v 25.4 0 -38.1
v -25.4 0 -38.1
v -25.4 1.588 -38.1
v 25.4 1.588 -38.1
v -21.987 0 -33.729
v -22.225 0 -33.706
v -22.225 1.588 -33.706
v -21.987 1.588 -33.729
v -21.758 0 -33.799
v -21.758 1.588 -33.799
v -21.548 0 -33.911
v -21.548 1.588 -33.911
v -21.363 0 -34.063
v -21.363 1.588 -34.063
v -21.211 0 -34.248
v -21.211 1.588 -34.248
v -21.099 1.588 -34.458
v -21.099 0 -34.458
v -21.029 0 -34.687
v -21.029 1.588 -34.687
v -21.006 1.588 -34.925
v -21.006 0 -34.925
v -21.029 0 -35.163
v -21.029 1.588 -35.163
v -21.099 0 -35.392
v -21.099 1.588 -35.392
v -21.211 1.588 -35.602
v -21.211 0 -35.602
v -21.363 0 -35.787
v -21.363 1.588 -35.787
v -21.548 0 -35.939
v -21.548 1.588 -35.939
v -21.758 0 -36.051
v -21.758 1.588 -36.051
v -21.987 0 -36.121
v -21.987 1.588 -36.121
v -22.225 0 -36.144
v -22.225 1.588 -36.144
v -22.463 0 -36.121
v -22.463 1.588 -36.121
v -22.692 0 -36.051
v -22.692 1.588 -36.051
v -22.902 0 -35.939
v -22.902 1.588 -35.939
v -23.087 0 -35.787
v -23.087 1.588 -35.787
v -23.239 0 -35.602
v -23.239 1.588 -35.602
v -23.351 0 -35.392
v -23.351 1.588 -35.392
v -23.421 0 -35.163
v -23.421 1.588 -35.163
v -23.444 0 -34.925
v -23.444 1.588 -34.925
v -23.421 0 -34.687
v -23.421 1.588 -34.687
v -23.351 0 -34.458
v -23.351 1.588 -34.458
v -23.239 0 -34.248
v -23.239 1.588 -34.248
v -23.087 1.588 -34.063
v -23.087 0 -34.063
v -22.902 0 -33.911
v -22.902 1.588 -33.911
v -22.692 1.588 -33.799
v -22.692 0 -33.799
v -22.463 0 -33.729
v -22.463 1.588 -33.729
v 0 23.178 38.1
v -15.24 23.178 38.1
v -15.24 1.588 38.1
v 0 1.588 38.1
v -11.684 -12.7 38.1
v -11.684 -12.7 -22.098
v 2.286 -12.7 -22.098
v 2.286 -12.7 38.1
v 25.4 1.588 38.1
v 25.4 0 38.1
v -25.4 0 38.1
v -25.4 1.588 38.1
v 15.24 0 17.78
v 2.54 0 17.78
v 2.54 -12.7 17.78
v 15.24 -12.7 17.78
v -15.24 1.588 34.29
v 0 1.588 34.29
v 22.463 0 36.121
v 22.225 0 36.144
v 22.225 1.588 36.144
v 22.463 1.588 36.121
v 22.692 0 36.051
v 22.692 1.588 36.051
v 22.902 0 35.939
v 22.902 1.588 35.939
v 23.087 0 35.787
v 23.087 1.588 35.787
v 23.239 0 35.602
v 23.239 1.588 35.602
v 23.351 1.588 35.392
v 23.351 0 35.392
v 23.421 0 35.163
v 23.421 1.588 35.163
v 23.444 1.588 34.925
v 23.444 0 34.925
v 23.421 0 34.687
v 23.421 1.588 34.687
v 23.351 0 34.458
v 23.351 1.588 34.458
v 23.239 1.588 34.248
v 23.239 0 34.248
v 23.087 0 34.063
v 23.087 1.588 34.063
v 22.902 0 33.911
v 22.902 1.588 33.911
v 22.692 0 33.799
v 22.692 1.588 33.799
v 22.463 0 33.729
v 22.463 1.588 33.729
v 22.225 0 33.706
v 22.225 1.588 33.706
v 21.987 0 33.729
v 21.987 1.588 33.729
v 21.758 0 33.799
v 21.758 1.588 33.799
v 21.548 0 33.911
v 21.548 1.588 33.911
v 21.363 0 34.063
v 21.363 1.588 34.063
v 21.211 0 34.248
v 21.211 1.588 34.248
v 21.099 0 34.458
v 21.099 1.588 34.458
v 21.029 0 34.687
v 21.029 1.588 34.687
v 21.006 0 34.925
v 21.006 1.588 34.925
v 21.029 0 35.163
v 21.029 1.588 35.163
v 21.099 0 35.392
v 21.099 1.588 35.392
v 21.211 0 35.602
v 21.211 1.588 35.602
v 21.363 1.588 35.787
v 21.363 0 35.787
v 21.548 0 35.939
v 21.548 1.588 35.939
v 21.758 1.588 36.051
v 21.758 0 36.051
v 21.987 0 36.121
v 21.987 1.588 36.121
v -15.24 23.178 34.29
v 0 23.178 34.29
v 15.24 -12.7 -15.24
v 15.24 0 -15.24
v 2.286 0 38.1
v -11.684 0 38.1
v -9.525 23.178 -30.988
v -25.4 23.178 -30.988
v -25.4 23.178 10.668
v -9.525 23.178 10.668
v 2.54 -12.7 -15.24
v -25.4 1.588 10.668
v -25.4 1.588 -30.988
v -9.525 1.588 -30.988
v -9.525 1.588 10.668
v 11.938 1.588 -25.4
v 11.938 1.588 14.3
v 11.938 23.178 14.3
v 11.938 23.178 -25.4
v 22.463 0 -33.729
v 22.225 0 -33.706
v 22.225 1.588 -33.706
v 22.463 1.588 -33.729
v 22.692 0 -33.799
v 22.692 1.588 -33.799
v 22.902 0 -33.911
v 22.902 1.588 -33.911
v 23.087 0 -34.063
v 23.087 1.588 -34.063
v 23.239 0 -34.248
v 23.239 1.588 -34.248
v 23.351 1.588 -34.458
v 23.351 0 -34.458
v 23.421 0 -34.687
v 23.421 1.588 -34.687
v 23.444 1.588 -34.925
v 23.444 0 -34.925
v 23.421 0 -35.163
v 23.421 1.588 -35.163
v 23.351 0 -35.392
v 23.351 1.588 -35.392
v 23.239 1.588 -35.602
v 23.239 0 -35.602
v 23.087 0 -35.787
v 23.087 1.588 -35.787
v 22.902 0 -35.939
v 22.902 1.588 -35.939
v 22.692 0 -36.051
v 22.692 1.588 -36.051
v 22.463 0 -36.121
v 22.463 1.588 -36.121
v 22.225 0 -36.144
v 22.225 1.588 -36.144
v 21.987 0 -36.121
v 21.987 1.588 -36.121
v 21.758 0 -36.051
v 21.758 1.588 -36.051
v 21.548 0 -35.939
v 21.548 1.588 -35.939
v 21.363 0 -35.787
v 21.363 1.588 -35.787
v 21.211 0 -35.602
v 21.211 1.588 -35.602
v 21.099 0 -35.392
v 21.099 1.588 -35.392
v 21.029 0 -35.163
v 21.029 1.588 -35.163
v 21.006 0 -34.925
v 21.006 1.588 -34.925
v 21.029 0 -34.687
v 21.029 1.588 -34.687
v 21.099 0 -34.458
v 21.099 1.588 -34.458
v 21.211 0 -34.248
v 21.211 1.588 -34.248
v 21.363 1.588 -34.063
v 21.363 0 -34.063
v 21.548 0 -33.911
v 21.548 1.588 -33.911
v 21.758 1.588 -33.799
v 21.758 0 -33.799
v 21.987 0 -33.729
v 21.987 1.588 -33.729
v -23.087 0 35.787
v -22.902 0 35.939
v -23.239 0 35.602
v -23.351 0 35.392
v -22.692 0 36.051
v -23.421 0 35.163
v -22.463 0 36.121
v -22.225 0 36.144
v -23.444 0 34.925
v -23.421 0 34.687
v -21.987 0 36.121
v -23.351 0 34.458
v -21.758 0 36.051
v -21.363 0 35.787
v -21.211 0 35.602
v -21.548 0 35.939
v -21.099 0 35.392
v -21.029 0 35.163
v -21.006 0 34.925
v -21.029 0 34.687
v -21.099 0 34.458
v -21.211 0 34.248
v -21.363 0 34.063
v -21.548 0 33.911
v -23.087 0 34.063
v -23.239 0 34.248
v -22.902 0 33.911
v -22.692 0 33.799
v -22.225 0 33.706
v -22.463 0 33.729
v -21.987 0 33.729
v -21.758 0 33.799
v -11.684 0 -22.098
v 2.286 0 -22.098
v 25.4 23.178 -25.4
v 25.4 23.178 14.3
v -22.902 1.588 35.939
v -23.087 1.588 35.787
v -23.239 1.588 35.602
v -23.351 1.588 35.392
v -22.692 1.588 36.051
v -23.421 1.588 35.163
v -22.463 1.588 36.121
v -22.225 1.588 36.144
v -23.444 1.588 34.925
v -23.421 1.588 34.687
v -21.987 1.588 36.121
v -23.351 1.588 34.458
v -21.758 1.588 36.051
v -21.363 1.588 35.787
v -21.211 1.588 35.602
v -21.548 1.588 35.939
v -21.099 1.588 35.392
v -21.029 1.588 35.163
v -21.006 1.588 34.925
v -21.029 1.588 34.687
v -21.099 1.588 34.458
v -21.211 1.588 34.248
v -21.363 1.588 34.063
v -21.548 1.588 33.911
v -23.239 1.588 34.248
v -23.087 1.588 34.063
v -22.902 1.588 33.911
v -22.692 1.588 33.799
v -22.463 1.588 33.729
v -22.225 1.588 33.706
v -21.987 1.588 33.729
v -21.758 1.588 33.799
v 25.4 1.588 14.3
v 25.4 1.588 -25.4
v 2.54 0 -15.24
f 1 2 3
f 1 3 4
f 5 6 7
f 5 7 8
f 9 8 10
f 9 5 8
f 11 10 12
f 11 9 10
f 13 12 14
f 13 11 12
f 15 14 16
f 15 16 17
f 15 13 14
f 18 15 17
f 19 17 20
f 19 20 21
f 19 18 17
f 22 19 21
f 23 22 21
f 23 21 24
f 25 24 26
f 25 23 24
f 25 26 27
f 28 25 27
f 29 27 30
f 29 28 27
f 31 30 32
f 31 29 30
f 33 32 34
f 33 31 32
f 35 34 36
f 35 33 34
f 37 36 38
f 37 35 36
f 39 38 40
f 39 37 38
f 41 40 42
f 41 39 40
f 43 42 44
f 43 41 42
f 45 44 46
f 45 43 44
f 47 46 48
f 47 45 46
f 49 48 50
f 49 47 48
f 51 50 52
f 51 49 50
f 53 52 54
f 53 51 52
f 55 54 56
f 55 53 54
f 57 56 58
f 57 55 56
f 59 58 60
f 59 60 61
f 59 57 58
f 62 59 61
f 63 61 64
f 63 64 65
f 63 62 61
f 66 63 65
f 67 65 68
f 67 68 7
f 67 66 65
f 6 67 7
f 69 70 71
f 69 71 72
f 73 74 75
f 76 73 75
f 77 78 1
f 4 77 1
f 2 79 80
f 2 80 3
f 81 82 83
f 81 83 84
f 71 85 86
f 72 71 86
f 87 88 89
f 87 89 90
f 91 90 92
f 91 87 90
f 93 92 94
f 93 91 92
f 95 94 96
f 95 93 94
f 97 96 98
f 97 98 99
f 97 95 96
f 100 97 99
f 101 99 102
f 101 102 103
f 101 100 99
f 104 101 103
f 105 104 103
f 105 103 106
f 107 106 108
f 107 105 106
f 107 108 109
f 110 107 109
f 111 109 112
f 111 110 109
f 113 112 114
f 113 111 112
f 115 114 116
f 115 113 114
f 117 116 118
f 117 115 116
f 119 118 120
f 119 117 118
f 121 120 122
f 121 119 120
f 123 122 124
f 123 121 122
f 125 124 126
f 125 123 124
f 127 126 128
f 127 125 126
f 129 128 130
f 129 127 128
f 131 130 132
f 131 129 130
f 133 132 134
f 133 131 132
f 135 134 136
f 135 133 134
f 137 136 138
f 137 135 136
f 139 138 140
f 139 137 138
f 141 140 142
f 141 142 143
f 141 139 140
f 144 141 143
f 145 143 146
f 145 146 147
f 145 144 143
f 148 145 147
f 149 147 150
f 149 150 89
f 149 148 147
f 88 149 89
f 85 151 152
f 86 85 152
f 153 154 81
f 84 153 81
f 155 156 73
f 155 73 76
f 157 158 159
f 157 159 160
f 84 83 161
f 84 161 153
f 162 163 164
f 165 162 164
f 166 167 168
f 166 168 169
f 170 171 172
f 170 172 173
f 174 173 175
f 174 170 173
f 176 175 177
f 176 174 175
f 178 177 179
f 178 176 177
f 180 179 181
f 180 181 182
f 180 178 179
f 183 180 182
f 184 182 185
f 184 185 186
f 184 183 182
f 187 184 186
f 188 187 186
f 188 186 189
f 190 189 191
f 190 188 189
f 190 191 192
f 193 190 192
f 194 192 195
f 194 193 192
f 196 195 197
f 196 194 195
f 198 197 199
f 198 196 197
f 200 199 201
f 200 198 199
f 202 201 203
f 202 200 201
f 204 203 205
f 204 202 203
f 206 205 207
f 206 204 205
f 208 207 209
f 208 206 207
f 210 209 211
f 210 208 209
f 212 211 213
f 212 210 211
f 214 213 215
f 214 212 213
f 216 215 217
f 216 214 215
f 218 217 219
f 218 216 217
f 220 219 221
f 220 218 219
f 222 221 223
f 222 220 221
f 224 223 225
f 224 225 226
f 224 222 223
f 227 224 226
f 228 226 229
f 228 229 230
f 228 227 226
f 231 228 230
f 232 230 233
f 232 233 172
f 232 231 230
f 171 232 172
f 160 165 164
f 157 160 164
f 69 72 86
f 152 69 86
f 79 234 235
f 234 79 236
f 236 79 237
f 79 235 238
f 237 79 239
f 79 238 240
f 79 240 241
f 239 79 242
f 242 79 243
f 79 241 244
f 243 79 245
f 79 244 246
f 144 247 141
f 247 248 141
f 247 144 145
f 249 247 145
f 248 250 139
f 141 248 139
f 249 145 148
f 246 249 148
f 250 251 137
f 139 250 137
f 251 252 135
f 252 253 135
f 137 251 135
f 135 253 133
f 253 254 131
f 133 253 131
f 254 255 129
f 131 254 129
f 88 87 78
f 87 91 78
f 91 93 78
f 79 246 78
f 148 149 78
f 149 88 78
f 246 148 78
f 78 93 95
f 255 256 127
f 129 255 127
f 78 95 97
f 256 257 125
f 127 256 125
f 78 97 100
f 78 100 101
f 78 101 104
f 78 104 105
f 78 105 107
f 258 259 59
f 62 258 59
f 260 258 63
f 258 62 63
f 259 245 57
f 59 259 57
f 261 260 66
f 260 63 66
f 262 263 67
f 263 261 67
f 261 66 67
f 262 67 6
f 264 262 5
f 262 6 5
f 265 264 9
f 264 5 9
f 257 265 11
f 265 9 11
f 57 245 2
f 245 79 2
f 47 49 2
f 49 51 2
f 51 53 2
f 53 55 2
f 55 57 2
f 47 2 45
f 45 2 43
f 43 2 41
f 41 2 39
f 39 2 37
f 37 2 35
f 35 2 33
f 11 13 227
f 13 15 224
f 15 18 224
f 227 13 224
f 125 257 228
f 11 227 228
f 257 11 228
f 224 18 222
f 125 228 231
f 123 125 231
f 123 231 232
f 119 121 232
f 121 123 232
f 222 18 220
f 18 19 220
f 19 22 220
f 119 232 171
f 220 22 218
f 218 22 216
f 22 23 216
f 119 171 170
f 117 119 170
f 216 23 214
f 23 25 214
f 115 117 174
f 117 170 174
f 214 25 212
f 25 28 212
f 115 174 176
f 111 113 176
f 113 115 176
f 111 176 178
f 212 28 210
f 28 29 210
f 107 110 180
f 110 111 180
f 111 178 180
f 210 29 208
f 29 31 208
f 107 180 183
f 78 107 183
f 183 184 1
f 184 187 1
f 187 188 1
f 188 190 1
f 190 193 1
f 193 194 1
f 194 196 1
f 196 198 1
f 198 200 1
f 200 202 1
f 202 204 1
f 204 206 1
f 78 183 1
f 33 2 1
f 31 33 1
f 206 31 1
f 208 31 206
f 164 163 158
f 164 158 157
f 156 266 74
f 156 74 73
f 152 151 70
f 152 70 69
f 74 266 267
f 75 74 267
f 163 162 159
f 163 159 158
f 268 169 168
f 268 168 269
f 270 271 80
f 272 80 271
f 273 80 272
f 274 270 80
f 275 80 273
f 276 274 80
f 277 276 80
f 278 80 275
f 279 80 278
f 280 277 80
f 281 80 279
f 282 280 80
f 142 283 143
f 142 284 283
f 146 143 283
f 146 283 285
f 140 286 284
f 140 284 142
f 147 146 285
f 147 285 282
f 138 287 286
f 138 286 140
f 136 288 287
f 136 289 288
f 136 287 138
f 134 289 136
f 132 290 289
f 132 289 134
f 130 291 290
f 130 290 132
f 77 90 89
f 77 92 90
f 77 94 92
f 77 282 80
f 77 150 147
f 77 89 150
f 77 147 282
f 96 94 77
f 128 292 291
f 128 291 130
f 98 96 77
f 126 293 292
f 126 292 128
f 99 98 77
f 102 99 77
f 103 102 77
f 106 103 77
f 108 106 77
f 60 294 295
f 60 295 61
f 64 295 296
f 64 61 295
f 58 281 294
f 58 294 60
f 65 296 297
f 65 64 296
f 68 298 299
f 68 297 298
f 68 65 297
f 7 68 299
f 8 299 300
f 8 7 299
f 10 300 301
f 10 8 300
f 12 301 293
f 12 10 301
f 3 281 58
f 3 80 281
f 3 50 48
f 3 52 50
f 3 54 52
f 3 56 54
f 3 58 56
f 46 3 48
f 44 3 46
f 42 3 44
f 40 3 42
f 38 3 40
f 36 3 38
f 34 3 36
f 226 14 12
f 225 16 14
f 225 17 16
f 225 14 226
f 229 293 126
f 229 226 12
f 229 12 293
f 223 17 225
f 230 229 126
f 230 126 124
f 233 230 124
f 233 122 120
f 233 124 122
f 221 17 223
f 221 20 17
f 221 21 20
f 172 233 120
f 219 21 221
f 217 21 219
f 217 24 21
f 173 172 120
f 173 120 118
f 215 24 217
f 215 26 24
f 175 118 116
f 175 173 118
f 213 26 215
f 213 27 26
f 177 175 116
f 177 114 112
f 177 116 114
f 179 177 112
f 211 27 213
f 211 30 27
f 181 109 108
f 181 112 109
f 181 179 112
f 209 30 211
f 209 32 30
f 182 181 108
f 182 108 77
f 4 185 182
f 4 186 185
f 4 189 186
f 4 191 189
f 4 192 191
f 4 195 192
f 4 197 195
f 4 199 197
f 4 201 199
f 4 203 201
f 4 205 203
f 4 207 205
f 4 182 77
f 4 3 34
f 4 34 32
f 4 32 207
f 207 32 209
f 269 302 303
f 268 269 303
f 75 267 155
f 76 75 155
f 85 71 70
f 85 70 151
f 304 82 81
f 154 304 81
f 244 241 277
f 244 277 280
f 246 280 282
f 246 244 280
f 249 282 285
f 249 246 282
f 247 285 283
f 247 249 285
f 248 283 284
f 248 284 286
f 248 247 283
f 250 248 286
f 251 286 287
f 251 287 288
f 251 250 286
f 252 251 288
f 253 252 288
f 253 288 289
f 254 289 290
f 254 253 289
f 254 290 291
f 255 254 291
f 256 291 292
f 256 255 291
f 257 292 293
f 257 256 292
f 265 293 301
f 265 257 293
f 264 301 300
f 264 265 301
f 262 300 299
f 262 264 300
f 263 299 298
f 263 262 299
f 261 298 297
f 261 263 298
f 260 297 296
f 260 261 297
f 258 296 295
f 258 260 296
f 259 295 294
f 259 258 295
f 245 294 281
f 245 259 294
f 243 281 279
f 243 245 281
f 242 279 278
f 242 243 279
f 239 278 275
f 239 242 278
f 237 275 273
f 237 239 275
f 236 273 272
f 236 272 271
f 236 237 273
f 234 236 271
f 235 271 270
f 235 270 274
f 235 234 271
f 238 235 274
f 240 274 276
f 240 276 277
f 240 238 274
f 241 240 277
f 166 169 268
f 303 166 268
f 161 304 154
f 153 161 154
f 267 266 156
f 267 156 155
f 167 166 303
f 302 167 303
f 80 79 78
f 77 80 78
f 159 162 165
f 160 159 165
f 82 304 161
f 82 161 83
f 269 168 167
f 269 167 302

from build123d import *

# Parameters (mm, degrees)
SKETCH1_W             = 50.8
SKETCH1_H             = 76.2
SKETCH1_R             = 1.2192
BOSS_EXTRUDE1_DEPTH   = 1.5875
SKETCH2_W             = 15.875
SKETCH2_H             = 41.656
BOSS_EXTRUDE2_DEPTH   = 21.59
SKETCH2_W_2           = 13.462
SKETCH2_H_2           = 39.7002
BOSS_EXTRUDE2_2_DEPTH = 21.59
SKETCH2_W_3           = 15.24
SKETCH2_H_3           = 3.81
BOSS_EXTRUDE2_3_DEPTH = 21.59
SKETCH3_W             = 13.97
SKETCH3_H             = 60.198
BOSS_EXTRUDE3_DEPTH   = 12.7
SKETCH3_W_2           = 12.7
SKETCH3_H_2           = 33.02
BOSS_EXTRUDE3_2_DEPTH = 12.7


with BuildPart() as part:
    # Sketch1 → Boss-Extrude1 (new body)
    with BuildSketch(Plane(origin=(0, 0, 0), x_dir=(1, 0, 0), z_dir=(0, 1, 0))):
        Rectangle(SKETCH1_W, SKETCH1_H)
        with Locations(Location((-22.225, 34.925, 0), (0, 0, 270))):
            Circle(SKETCH1_R, mode=Mode.SUBTRACT)
        with Locations(Location((22.225, 34.925, 0), (0, 0, 270))):
            Circle(SKETCH1_R, mode=Mode.SUBTRACT)
        with Locations(Location((-22.225, -34.925, 0), (0, 0, 270))):
            Circle(SKETCH1_R, mode=Mode.SUBTRACT)
        with Locations(Location((22.225, -34.925, 0), (0, 0, 270))):
            Circle(SKETCH1_R, mode=Mode.SUBTRACT)
    extrude(amount=BOSS_EXTRUDE1_DEPTH)


with BuildPart() as body_2:
    # Sketch2 → Boss-Extrude2 (new body)
    with BuildSketch(Plane(origin=(0, 1.5875, 0), x_dir=(1, 0, 0), z_dir=(0, 1, 0))):
        with Locations((-17.4625, 10.16)):
            Rectangle(SKETCH2_W, SKETCH2_H)
    extrude(amount=BOSS_EXTRUDE2_DEPTH)


with BuildPart() as body_3:
    # Sketch2 → Boss-Extrude2 2 (new body)
    with BuildSketch(Plane(origin=(0, 1.5875, 0), x_dir=(1, 0, 0), z_dir=(0, 1, 0))):
        with Locations((18.669, 5.5499)):
            Rectangle(SKETCH2_W_2, SKETCH2_H_2)
    extrude(amount=BOSS_EXTRUDE2_2_DEPTH)


with BuildPart() as body_4:
    # Sketch2 → Boss-Extrude2 3 (new body)
    with BuildSketch(Plane(origin=(0, 1.5875, 0), x_dir=(1, 0, 0), z_dir=(0, 1, 0))):
        with Locations((-7.62, -36.195)):
            Rectangle(SKETCH2_W_3, SKETCH2_H_3)
    extrude(amount=BOSS_EXTRUDE2_3_DEPTH)


with BuildPart() as body_5:
    # Sketch3 → Boss-Extrude3 (new body)
    with BuildSketch(Plane.XZ):
        with Locations((-4.699, 8.001)):
            Rectangle(SKETCH3_W, SKETCH3_H)
    extrude(amount=BOSS_EXTRUDE3_DEPTH)


with BuildPart() as body_6:
    # Sketch3 → Boss-Extrude3 2 (new body)
    with BuildSketch(Plane.XZ):
        with Locations((8.89, 1.27)):
            Rectangle(SKETCH3_W_2, SKETCH3_H_2)
    extrude(amount=BOSS_EXTRUDE3_2_DEPTH)


solid = Compound([part.part, body_2.part, body_3.part, body_4.part, body_5.part, body_6.part])
